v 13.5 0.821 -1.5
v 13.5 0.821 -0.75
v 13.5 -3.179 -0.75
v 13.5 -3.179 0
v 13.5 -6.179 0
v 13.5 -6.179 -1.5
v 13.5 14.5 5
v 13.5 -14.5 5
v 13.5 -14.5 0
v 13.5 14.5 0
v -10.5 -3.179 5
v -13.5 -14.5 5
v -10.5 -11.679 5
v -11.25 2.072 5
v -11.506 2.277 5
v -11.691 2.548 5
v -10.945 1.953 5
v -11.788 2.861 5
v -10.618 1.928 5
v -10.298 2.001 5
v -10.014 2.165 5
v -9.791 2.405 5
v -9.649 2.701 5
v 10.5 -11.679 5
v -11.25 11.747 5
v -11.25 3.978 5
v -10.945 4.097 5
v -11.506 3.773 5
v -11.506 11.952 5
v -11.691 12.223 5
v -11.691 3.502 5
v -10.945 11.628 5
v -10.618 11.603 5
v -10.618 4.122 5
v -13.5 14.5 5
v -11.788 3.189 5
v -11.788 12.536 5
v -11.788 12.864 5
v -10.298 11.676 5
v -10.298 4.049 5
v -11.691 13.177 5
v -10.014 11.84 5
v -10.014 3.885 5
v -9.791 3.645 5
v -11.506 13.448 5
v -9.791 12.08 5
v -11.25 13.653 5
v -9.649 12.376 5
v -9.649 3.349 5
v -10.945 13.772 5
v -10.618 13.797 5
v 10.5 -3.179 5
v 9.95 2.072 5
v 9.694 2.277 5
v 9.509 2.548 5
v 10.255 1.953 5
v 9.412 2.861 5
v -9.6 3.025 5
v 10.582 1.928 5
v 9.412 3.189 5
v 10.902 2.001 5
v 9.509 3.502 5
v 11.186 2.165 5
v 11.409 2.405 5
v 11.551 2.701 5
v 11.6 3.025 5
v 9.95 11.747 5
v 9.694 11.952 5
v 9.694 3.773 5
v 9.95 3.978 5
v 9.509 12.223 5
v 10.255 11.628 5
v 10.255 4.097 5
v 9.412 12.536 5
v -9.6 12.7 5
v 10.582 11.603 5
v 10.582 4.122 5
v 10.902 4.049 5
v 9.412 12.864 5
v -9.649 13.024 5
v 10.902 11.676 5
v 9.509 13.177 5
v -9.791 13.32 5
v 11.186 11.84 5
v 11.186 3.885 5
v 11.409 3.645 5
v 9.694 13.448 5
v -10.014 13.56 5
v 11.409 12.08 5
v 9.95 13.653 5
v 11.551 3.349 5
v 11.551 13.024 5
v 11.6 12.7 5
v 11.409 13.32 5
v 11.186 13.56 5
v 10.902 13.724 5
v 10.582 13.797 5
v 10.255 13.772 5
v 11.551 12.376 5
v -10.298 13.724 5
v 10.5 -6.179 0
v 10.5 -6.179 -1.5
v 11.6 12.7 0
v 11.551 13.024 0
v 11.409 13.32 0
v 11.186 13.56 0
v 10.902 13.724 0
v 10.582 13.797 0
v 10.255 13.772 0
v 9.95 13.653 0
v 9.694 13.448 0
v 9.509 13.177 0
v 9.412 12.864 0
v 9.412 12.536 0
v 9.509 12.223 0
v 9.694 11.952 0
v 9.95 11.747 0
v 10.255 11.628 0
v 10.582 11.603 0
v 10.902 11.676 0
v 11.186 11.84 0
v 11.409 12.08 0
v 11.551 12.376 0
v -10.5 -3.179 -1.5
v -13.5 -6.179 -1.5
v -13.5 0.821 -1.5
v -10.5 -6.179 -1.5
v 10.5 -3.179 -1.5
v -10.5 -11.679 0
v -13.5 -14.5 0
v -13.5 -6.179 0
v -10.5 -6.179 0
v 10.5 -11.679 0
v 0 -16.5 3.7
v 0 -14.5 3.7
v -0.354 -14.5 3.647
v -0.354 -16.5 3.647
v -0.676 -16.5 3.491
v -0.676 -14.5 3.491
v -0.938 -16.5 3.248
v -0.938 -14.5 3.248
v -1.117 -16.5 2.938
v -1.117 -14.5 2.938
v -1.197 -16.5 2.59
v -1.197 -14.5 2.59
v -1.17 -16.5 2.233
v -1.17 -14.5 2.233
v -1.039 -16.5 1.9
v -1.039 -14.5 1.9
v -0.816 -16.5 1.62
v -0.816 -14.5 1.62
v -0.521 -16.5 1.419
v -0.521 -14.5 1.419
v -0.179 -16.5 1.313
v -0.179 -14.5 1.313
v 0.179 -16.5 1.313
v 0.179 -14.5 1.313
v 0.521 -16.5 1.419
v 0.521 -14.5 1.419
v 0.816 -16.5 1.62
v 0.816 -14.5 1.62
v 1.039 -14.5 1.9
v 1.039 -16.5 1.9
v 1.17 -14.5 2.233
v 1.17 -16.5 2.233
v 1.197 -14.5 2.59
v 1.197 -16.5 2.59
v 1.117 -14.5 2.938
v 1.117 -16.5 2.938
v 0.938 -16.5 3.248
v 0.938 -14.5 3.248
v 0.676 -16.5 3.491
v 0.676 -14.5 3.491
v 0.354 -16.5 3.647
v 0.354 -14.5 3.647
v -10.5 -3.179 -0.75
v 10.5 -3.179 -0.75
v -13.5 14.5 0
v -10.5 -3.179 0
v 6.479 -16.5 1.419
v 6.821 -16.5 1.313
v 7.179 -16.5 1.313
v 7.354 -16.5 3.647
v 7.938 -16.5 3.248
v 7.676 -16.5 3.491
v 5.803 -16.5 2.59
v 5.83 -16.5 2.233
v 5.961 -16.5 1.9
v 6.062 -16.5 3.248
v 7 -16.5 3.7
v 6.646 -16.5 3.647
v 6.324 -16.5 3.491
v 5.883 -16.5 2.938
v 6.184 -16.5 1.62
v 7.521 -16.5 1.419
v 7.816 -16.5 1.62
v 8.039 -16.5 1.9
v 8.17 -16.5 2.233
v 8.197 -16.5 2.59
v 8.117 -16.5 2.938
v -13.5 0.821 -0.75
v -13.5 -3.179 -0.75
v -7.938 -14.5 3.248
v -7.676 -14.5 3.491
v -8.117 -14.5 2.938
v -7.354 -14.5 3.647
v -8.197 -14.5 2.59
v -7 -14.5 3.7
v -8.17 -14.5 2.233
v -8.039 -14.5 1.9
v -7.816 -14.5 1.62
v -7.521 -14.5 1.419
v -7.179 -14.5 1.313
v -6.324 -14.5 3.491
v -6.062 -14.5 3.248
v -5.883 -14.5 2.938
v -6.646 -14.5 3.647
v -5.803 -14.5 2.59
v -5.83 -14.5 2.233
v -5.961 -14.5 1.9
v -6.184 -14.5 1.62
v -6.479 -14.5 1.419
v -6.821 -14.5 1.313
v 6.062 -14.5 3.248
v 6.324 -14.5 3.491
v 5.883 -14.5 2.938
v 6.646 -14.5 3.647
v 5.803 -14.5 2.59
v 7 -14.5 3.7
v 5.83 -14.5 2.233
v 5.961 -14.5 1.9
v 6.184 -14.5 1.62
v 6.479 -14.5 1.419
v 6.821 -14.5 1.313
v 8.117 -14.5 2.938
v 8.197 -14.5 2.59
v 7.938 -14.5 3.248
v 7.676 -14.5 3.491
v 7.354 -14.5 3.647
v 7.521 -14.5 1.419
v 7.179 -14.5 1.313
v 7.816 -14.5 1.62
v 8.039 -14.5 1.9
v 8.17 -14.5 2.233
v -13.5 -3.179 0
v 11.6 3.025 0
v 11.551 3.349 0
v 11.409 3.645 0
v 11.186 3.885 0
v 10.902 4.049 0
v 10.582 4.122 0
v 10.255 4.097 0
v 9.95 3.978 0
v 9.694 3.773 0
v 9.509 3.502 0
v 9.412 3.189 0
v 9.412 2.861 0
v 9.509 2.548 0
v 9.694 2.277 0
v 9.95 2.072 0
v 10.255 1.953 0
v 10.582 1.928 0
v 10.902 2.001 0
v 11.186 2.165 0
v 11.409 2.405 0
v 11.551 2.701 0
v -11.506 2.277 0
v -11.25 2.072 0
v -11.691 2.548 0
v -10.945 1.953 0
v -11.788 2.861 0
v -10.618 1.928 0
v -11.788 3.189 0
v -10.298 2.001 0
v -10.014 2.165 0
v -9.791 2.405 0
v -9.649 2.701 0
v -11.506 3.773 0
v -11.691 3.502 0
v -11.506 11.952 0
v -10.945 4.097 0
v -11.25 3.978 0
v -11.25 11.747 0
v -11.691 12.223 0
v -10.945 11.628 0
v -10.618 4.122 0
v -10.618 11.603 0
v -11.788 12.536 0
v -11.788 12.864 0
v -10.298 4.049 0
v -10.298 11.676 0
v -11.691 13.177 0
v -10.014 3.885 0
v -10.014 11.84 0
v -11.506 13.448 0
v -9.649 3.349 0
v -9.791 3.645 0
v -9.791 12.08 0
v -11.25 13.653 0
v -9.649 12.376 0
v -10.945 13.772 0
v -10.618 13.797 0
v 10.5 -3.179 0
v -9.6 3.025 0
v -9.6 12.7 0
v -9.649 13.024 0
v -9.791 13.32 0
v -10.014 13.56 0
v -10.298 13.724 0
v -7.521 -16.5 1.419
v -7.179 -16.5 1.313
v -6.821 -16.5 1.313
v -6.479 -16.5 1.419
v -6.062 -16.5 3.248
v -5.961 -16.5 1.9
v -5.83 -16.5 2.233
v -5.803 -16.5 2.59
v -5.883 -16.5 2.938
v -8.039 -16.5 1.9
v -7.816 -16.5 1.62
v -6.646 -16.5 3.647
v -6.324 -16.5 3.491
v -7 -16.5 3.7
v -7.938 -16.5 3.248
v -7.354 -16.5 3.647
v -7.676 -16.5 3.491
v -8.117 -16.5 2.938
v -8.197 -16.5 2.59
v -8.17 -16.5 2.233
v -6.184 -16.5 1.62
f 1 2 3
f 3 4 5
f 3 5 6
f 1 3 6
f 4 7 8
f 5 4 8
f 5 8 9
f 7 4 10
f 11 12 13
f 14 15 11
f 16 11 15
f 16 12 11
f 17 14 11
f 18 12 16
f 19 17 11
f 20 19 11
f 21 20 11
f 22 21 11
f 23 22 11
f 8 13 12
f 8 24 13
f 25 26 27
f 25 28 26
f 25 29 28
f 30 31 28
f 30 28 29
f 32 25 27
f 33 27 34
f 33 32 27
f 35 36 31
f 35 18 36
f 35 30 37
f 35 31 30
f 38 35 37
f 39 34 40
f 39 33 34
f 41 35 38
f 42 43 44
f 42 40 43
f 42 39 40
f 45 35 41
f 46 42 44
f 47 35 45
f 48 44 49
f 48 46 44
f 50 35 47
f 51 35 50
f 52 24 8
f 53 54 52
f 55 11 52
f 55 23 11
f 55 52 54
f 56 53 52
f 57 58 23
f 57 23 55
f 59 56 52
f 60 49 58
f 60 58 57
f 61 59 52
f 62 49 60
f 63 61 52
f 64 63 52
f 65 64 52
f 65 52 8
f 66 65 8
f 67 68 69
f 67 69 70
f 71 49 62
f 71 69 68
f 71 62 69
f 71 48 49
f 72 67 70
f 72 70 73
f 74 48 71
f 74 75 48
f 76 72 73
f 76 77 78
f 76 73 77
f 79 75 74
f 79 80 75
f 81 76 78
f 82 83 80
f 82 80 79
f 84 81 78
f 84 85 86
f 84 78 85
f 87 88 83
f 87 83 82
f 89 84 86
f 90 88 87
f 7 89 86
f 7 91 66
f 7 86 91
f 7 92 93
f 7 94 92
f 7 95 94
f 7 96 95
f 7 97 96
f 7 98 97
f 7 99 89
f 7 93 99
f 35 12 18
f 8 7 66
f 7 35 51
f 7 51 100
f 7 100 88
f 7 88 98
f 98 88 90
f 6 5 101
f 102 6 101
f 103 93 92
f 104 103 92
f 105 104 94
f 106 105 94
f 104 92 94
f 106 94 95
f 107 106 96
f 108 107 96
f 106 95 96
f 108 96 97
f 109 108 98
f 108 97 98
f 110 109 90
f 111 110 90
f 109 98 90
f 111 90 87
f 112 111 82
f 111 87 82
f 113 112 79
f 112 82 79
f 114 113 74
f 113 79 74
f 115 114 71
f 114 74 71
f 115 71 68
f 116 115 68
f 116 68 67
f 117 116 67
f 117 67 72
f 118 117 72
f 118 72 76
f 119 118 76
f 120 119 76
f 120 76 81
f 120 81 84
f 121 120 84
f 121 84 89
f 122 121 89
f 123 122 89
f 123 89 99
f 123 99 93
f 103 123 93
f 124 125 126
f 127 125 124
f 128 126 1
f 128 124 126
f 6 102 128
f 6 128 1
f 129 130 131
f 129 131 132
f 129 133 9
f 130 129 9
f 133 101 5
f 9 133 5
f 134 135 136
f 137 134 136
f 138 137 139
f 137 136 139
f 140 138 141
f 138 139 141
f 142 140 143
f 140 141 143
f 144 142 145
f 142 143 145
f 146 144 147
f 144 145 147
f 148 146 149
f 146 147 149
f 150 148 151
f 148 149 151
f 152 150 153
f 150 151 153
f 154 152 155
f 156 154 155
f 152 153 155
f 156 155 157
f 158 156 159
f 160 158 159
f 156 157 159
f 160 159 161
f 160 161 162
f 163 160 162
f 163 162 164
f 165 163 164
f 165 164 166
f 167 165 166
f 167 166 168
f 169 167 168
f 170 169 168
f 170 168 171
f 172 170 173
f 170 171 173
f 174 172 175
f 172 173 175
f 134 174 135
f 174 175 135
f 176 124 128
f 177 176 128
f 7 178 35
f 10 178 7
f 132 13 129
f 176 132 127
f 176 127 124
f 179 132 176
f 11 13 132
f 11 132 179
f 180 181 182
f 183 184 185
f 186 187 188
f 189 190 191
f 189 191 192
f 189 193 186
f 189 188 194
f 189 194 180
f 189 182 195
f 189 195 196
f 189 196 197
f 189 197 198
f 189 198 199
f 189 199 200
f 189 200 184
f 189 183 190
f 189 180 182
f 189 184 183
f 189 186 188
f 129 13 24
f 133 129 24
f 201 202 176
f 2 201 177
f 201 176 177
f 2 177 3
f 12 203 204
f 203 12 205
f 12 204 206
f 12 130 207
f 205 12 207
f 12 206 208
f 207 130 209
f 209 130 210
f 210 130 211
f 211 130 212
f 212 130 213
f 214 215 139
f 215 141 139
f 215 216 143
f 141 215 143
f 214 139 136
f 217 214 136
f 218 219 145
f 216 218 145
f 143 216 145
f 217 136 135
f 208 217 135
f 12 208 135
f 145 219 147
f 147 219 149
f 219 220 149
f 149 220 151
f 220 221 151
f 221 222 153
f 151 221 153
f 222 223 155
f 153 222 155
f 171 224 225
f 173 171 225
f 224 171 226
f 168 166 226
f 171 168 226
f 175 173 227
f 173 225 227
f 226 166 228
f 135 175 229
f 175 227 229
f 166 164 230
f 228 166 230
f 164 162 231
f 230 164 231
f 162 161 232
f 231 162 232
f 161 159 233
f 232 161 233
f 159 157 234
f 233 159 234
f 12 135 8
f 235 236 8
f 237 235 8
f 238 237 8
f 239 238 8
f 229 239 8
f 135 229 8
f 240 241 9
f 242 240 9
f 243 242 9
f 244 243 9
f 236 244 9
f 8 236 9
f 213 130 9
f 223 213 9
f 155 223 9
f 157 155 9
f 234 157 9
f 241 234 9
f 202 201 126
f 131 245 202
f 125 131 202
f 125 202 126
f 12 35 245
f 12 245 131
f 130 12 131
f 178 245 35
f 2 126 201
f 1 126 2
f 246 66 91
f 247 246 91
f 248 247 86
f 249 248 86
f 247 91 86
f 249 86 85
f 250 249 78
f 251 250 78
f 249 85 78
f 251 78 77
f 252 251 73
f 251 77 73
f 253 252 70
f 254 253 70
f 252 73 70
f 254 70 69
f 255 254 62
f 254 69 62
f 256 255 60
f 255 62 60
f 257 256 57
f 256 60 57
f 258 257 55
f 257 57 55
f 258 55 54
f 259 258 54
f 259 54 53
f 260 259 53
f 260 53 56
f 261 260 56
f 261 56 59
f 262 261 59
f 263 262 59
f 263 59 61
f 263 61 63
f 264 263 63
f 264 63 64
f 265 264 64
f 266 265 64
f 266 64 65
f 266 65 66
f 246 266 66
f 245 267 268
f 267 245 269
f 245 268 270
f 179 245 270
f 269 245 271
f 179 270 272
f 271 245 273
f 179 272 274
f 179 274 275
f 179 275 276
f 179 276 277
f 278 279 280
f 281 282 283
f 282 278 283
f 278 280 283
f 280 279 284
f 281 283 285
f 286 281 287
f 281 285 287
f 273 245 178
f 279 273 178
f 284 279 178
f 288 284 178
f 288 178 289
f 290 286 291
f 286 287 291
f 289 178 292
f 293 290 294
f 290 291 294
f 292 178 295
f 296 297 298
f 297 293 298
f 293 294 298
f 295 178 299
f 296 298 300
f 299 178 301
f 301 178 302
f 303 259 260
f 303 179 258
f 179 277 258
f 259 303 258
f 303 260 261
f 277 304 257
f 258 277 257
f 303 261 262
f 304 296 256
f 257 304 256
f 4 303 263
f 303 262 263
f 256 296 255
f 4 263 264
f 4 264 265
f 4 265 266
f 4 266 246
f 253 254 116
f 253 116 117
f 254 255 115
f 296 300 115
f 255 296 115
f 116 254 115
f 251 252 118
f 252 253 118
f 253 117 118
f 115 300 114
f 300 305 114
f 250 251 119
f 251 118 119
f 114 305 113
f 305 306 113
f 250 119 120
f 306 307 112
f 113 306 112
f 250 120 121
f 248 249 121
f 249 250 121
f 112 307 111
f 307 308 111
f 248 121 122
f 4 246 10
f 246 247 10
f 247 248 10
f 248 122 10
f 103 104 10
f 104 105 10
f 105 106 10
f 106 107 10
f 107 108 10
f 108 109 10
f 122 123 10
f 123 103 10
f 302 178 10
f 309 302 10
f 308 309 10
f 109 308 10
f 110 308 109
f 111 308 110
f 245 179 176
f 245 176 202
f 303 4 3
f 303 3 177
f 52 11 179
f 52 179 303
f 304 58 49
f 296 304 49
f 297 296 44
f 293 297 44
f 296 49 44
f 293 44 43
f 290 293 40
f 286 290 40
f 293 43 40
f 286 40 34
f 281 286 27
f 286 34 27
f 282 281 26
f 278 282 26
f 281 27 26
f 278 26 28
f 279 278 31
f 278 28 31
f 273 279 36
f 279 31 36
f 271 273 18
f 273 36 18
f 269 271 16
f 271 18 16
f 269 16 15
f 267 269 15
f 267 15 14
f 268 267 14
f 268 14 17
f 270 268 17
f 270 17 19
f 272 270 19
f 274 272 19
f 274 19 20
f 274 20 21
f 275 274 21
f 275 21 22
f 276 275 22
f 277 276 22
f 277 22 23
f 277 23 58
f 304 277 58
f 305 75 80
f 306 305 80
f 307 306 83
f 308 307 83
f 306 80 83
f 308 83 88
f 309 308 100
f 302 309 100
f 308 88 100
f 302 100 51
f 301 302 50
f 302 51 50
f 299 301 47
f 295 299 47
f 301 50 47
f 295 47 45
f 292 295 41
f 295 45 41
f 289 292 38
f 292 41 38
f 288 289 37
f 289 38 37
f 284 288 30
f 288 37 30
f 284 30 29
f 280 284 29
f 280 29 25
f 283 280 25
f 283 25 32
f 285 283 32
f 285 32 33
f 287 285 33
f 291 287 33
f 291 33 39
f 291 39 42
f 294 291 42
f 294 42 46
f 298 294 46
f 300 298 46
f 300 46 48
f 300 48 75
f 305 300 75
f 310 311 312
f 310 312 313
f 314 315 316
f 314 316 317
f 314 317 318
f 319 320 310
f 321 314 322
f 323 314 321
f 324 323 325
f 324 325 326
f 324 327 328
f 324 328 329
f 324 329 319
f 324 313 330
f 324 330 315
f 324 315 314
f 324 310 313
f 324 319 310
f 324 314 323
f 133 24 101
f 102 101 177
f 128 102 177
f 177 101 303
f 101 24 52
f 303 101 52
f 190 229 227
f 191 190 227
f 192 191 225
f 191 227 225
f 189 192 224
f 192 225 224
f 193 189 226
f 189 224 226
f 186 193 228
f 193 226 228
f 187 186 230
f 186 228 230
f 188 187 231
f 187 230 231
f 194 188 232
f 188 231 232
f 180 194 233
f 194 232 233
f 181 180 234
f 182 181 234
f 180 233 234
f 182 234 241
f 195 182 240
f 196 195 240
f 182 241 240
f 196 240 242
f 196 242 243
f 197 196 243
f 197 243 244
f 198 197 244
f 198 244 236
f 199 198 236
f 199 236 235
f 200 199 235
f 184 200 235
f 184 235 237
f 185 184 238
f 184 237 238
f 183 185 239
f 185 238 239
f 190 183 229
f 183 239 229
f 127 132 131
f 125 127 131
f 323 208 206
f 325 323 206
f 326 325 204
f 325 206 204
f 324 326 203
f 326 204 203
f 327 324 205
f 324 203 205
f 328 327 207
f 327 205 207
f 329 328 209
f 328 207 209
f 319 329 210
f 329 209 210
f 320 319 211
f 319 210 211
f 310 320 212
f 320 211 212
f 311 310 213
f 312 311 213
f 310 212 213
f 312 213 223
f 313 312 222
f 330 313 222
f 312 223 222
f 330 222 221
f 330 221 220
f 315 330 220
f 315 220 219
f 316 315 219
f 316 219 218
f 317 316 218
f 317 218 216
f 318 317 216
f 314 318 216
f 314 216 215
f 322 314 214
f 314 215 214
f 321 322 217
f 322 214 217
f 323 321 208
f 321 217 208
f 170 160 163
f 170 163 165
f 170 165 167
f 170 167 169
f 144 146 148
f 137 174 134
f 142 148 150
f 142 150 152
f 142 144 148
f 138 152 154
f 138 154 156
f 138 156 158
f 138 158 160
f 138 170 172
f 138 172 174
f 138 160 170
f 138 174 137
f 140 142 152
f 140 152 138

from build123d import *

# Parameters (mm, degrees)
SKETCH1_W           = 27
SKETCH1_H           = 29
BOSS_EXTRUDE1_DEPTH = 5
SKETCH3_R           = 1.1
CUT_EXTRUDE2_DEPTH  = 10
SKETCH4_W           = 21
SKETCH4_H           = 8.5
CUT_EXTRUDE3_DEPTH  = 10
SKETCH2_R           = 1.2
BOSS_EXTRUDE2_DEPTH = 2
SKETCH7_W           = 3
SKETCH7_H           = 3
BOSS_EXTRUDE5_DEPTH = 1.5
SKETCH8_W           = 27
SKETCH8_H           = 0.75
BOSS_EXTRUDE6_DEPTH = 4


with BuildPart() as part:
    # Sketch1 → Boss-Extrude1 (new body)
    with BuildSketch(Plane.XY):
        Rectangle(SKETCH1_W, SKETCH1_H)
    extrude(amount=BOSS_EXTRUDE1_DEPTH)

    # Sketch3 → Cut-Extrude2 (cut)
    with BuildSketch(Plane.XY.offset(5)):
        with Locations((-10.7, 12.7)):
            Circle(SKETCH3_R)
        with Locations((10.5, 12.7)):
            Circle(SKETCH3_R)
        with Locations((-10.7, 3.025)):
            Circle(SKETCH3_R)
        with Locations((10.5, 3.025)):
            Circle(SKETCH3_R)
    extrude(amount=-CUT_EXTRUDE2_DEPTH, mode=Mode.SUBTRACT)

    # Sketch4 → Cut-Extrude3 (cut)
    with BuildSketch(Plane.XY.offset(5)):
        with Locations((0, -7.429078055)):
            Rectangle(SKETCH4_W, SKETCH4_H)
    extrude(amount=-CUT_EXTRUDE3_DEPTH, mode=Mode.SUBTRACT)

    # Sketch2 → Boss-Extrude2 (add)
    with BuildSketch(Plane.XZ.offset(14.5)):
        with Locations(Location((-7, 2.5, 0), (0, 0, 90))):
            Circle(SKETCH2_R)
        with Locations(Location((0, 2.5, 0), (0, 0, 90))):
            Circle(SKETCH2_R)
        with Locations(Location((7, 2.5, 0), (0, 0, 90))):
            Circle(SKETCH2_R)
    extrude(amount=BOSS_EXTRUDE2_DEPTH)

    # Sketch7 → Boss-Extrude5 (add)
    with BuildSketch(Plane(origin=(0, 0, 0), x_dir=(-1, 0, 0), z_dir=(0, 0, -1))):
        with Locations((-12, -4.679078055)):
            Rectangle(SKETCH7_W, SKETCH7_H)
        with Locations((12, -4.679078055)):
            Rectangle(SKETCH7_W, SKETCH7_H)
    extrude(amount=BOSS_EXTRUDE5_DEPTH)

    # Sketch8 → Boss-Extrude6 (add)
    with BuildSketch(Plane(origin=(0, -3.179078055, 0), x_dir=(1, 0, 0), z_dir=(0, 1, 0))):
        with Locations((0, 1.125)):
            Rectangle(SKETCH8_W, SKETCH8_H)
    extrude(amount=BOSS_EXTRUDE6_DEPTH)


solid = part.part
